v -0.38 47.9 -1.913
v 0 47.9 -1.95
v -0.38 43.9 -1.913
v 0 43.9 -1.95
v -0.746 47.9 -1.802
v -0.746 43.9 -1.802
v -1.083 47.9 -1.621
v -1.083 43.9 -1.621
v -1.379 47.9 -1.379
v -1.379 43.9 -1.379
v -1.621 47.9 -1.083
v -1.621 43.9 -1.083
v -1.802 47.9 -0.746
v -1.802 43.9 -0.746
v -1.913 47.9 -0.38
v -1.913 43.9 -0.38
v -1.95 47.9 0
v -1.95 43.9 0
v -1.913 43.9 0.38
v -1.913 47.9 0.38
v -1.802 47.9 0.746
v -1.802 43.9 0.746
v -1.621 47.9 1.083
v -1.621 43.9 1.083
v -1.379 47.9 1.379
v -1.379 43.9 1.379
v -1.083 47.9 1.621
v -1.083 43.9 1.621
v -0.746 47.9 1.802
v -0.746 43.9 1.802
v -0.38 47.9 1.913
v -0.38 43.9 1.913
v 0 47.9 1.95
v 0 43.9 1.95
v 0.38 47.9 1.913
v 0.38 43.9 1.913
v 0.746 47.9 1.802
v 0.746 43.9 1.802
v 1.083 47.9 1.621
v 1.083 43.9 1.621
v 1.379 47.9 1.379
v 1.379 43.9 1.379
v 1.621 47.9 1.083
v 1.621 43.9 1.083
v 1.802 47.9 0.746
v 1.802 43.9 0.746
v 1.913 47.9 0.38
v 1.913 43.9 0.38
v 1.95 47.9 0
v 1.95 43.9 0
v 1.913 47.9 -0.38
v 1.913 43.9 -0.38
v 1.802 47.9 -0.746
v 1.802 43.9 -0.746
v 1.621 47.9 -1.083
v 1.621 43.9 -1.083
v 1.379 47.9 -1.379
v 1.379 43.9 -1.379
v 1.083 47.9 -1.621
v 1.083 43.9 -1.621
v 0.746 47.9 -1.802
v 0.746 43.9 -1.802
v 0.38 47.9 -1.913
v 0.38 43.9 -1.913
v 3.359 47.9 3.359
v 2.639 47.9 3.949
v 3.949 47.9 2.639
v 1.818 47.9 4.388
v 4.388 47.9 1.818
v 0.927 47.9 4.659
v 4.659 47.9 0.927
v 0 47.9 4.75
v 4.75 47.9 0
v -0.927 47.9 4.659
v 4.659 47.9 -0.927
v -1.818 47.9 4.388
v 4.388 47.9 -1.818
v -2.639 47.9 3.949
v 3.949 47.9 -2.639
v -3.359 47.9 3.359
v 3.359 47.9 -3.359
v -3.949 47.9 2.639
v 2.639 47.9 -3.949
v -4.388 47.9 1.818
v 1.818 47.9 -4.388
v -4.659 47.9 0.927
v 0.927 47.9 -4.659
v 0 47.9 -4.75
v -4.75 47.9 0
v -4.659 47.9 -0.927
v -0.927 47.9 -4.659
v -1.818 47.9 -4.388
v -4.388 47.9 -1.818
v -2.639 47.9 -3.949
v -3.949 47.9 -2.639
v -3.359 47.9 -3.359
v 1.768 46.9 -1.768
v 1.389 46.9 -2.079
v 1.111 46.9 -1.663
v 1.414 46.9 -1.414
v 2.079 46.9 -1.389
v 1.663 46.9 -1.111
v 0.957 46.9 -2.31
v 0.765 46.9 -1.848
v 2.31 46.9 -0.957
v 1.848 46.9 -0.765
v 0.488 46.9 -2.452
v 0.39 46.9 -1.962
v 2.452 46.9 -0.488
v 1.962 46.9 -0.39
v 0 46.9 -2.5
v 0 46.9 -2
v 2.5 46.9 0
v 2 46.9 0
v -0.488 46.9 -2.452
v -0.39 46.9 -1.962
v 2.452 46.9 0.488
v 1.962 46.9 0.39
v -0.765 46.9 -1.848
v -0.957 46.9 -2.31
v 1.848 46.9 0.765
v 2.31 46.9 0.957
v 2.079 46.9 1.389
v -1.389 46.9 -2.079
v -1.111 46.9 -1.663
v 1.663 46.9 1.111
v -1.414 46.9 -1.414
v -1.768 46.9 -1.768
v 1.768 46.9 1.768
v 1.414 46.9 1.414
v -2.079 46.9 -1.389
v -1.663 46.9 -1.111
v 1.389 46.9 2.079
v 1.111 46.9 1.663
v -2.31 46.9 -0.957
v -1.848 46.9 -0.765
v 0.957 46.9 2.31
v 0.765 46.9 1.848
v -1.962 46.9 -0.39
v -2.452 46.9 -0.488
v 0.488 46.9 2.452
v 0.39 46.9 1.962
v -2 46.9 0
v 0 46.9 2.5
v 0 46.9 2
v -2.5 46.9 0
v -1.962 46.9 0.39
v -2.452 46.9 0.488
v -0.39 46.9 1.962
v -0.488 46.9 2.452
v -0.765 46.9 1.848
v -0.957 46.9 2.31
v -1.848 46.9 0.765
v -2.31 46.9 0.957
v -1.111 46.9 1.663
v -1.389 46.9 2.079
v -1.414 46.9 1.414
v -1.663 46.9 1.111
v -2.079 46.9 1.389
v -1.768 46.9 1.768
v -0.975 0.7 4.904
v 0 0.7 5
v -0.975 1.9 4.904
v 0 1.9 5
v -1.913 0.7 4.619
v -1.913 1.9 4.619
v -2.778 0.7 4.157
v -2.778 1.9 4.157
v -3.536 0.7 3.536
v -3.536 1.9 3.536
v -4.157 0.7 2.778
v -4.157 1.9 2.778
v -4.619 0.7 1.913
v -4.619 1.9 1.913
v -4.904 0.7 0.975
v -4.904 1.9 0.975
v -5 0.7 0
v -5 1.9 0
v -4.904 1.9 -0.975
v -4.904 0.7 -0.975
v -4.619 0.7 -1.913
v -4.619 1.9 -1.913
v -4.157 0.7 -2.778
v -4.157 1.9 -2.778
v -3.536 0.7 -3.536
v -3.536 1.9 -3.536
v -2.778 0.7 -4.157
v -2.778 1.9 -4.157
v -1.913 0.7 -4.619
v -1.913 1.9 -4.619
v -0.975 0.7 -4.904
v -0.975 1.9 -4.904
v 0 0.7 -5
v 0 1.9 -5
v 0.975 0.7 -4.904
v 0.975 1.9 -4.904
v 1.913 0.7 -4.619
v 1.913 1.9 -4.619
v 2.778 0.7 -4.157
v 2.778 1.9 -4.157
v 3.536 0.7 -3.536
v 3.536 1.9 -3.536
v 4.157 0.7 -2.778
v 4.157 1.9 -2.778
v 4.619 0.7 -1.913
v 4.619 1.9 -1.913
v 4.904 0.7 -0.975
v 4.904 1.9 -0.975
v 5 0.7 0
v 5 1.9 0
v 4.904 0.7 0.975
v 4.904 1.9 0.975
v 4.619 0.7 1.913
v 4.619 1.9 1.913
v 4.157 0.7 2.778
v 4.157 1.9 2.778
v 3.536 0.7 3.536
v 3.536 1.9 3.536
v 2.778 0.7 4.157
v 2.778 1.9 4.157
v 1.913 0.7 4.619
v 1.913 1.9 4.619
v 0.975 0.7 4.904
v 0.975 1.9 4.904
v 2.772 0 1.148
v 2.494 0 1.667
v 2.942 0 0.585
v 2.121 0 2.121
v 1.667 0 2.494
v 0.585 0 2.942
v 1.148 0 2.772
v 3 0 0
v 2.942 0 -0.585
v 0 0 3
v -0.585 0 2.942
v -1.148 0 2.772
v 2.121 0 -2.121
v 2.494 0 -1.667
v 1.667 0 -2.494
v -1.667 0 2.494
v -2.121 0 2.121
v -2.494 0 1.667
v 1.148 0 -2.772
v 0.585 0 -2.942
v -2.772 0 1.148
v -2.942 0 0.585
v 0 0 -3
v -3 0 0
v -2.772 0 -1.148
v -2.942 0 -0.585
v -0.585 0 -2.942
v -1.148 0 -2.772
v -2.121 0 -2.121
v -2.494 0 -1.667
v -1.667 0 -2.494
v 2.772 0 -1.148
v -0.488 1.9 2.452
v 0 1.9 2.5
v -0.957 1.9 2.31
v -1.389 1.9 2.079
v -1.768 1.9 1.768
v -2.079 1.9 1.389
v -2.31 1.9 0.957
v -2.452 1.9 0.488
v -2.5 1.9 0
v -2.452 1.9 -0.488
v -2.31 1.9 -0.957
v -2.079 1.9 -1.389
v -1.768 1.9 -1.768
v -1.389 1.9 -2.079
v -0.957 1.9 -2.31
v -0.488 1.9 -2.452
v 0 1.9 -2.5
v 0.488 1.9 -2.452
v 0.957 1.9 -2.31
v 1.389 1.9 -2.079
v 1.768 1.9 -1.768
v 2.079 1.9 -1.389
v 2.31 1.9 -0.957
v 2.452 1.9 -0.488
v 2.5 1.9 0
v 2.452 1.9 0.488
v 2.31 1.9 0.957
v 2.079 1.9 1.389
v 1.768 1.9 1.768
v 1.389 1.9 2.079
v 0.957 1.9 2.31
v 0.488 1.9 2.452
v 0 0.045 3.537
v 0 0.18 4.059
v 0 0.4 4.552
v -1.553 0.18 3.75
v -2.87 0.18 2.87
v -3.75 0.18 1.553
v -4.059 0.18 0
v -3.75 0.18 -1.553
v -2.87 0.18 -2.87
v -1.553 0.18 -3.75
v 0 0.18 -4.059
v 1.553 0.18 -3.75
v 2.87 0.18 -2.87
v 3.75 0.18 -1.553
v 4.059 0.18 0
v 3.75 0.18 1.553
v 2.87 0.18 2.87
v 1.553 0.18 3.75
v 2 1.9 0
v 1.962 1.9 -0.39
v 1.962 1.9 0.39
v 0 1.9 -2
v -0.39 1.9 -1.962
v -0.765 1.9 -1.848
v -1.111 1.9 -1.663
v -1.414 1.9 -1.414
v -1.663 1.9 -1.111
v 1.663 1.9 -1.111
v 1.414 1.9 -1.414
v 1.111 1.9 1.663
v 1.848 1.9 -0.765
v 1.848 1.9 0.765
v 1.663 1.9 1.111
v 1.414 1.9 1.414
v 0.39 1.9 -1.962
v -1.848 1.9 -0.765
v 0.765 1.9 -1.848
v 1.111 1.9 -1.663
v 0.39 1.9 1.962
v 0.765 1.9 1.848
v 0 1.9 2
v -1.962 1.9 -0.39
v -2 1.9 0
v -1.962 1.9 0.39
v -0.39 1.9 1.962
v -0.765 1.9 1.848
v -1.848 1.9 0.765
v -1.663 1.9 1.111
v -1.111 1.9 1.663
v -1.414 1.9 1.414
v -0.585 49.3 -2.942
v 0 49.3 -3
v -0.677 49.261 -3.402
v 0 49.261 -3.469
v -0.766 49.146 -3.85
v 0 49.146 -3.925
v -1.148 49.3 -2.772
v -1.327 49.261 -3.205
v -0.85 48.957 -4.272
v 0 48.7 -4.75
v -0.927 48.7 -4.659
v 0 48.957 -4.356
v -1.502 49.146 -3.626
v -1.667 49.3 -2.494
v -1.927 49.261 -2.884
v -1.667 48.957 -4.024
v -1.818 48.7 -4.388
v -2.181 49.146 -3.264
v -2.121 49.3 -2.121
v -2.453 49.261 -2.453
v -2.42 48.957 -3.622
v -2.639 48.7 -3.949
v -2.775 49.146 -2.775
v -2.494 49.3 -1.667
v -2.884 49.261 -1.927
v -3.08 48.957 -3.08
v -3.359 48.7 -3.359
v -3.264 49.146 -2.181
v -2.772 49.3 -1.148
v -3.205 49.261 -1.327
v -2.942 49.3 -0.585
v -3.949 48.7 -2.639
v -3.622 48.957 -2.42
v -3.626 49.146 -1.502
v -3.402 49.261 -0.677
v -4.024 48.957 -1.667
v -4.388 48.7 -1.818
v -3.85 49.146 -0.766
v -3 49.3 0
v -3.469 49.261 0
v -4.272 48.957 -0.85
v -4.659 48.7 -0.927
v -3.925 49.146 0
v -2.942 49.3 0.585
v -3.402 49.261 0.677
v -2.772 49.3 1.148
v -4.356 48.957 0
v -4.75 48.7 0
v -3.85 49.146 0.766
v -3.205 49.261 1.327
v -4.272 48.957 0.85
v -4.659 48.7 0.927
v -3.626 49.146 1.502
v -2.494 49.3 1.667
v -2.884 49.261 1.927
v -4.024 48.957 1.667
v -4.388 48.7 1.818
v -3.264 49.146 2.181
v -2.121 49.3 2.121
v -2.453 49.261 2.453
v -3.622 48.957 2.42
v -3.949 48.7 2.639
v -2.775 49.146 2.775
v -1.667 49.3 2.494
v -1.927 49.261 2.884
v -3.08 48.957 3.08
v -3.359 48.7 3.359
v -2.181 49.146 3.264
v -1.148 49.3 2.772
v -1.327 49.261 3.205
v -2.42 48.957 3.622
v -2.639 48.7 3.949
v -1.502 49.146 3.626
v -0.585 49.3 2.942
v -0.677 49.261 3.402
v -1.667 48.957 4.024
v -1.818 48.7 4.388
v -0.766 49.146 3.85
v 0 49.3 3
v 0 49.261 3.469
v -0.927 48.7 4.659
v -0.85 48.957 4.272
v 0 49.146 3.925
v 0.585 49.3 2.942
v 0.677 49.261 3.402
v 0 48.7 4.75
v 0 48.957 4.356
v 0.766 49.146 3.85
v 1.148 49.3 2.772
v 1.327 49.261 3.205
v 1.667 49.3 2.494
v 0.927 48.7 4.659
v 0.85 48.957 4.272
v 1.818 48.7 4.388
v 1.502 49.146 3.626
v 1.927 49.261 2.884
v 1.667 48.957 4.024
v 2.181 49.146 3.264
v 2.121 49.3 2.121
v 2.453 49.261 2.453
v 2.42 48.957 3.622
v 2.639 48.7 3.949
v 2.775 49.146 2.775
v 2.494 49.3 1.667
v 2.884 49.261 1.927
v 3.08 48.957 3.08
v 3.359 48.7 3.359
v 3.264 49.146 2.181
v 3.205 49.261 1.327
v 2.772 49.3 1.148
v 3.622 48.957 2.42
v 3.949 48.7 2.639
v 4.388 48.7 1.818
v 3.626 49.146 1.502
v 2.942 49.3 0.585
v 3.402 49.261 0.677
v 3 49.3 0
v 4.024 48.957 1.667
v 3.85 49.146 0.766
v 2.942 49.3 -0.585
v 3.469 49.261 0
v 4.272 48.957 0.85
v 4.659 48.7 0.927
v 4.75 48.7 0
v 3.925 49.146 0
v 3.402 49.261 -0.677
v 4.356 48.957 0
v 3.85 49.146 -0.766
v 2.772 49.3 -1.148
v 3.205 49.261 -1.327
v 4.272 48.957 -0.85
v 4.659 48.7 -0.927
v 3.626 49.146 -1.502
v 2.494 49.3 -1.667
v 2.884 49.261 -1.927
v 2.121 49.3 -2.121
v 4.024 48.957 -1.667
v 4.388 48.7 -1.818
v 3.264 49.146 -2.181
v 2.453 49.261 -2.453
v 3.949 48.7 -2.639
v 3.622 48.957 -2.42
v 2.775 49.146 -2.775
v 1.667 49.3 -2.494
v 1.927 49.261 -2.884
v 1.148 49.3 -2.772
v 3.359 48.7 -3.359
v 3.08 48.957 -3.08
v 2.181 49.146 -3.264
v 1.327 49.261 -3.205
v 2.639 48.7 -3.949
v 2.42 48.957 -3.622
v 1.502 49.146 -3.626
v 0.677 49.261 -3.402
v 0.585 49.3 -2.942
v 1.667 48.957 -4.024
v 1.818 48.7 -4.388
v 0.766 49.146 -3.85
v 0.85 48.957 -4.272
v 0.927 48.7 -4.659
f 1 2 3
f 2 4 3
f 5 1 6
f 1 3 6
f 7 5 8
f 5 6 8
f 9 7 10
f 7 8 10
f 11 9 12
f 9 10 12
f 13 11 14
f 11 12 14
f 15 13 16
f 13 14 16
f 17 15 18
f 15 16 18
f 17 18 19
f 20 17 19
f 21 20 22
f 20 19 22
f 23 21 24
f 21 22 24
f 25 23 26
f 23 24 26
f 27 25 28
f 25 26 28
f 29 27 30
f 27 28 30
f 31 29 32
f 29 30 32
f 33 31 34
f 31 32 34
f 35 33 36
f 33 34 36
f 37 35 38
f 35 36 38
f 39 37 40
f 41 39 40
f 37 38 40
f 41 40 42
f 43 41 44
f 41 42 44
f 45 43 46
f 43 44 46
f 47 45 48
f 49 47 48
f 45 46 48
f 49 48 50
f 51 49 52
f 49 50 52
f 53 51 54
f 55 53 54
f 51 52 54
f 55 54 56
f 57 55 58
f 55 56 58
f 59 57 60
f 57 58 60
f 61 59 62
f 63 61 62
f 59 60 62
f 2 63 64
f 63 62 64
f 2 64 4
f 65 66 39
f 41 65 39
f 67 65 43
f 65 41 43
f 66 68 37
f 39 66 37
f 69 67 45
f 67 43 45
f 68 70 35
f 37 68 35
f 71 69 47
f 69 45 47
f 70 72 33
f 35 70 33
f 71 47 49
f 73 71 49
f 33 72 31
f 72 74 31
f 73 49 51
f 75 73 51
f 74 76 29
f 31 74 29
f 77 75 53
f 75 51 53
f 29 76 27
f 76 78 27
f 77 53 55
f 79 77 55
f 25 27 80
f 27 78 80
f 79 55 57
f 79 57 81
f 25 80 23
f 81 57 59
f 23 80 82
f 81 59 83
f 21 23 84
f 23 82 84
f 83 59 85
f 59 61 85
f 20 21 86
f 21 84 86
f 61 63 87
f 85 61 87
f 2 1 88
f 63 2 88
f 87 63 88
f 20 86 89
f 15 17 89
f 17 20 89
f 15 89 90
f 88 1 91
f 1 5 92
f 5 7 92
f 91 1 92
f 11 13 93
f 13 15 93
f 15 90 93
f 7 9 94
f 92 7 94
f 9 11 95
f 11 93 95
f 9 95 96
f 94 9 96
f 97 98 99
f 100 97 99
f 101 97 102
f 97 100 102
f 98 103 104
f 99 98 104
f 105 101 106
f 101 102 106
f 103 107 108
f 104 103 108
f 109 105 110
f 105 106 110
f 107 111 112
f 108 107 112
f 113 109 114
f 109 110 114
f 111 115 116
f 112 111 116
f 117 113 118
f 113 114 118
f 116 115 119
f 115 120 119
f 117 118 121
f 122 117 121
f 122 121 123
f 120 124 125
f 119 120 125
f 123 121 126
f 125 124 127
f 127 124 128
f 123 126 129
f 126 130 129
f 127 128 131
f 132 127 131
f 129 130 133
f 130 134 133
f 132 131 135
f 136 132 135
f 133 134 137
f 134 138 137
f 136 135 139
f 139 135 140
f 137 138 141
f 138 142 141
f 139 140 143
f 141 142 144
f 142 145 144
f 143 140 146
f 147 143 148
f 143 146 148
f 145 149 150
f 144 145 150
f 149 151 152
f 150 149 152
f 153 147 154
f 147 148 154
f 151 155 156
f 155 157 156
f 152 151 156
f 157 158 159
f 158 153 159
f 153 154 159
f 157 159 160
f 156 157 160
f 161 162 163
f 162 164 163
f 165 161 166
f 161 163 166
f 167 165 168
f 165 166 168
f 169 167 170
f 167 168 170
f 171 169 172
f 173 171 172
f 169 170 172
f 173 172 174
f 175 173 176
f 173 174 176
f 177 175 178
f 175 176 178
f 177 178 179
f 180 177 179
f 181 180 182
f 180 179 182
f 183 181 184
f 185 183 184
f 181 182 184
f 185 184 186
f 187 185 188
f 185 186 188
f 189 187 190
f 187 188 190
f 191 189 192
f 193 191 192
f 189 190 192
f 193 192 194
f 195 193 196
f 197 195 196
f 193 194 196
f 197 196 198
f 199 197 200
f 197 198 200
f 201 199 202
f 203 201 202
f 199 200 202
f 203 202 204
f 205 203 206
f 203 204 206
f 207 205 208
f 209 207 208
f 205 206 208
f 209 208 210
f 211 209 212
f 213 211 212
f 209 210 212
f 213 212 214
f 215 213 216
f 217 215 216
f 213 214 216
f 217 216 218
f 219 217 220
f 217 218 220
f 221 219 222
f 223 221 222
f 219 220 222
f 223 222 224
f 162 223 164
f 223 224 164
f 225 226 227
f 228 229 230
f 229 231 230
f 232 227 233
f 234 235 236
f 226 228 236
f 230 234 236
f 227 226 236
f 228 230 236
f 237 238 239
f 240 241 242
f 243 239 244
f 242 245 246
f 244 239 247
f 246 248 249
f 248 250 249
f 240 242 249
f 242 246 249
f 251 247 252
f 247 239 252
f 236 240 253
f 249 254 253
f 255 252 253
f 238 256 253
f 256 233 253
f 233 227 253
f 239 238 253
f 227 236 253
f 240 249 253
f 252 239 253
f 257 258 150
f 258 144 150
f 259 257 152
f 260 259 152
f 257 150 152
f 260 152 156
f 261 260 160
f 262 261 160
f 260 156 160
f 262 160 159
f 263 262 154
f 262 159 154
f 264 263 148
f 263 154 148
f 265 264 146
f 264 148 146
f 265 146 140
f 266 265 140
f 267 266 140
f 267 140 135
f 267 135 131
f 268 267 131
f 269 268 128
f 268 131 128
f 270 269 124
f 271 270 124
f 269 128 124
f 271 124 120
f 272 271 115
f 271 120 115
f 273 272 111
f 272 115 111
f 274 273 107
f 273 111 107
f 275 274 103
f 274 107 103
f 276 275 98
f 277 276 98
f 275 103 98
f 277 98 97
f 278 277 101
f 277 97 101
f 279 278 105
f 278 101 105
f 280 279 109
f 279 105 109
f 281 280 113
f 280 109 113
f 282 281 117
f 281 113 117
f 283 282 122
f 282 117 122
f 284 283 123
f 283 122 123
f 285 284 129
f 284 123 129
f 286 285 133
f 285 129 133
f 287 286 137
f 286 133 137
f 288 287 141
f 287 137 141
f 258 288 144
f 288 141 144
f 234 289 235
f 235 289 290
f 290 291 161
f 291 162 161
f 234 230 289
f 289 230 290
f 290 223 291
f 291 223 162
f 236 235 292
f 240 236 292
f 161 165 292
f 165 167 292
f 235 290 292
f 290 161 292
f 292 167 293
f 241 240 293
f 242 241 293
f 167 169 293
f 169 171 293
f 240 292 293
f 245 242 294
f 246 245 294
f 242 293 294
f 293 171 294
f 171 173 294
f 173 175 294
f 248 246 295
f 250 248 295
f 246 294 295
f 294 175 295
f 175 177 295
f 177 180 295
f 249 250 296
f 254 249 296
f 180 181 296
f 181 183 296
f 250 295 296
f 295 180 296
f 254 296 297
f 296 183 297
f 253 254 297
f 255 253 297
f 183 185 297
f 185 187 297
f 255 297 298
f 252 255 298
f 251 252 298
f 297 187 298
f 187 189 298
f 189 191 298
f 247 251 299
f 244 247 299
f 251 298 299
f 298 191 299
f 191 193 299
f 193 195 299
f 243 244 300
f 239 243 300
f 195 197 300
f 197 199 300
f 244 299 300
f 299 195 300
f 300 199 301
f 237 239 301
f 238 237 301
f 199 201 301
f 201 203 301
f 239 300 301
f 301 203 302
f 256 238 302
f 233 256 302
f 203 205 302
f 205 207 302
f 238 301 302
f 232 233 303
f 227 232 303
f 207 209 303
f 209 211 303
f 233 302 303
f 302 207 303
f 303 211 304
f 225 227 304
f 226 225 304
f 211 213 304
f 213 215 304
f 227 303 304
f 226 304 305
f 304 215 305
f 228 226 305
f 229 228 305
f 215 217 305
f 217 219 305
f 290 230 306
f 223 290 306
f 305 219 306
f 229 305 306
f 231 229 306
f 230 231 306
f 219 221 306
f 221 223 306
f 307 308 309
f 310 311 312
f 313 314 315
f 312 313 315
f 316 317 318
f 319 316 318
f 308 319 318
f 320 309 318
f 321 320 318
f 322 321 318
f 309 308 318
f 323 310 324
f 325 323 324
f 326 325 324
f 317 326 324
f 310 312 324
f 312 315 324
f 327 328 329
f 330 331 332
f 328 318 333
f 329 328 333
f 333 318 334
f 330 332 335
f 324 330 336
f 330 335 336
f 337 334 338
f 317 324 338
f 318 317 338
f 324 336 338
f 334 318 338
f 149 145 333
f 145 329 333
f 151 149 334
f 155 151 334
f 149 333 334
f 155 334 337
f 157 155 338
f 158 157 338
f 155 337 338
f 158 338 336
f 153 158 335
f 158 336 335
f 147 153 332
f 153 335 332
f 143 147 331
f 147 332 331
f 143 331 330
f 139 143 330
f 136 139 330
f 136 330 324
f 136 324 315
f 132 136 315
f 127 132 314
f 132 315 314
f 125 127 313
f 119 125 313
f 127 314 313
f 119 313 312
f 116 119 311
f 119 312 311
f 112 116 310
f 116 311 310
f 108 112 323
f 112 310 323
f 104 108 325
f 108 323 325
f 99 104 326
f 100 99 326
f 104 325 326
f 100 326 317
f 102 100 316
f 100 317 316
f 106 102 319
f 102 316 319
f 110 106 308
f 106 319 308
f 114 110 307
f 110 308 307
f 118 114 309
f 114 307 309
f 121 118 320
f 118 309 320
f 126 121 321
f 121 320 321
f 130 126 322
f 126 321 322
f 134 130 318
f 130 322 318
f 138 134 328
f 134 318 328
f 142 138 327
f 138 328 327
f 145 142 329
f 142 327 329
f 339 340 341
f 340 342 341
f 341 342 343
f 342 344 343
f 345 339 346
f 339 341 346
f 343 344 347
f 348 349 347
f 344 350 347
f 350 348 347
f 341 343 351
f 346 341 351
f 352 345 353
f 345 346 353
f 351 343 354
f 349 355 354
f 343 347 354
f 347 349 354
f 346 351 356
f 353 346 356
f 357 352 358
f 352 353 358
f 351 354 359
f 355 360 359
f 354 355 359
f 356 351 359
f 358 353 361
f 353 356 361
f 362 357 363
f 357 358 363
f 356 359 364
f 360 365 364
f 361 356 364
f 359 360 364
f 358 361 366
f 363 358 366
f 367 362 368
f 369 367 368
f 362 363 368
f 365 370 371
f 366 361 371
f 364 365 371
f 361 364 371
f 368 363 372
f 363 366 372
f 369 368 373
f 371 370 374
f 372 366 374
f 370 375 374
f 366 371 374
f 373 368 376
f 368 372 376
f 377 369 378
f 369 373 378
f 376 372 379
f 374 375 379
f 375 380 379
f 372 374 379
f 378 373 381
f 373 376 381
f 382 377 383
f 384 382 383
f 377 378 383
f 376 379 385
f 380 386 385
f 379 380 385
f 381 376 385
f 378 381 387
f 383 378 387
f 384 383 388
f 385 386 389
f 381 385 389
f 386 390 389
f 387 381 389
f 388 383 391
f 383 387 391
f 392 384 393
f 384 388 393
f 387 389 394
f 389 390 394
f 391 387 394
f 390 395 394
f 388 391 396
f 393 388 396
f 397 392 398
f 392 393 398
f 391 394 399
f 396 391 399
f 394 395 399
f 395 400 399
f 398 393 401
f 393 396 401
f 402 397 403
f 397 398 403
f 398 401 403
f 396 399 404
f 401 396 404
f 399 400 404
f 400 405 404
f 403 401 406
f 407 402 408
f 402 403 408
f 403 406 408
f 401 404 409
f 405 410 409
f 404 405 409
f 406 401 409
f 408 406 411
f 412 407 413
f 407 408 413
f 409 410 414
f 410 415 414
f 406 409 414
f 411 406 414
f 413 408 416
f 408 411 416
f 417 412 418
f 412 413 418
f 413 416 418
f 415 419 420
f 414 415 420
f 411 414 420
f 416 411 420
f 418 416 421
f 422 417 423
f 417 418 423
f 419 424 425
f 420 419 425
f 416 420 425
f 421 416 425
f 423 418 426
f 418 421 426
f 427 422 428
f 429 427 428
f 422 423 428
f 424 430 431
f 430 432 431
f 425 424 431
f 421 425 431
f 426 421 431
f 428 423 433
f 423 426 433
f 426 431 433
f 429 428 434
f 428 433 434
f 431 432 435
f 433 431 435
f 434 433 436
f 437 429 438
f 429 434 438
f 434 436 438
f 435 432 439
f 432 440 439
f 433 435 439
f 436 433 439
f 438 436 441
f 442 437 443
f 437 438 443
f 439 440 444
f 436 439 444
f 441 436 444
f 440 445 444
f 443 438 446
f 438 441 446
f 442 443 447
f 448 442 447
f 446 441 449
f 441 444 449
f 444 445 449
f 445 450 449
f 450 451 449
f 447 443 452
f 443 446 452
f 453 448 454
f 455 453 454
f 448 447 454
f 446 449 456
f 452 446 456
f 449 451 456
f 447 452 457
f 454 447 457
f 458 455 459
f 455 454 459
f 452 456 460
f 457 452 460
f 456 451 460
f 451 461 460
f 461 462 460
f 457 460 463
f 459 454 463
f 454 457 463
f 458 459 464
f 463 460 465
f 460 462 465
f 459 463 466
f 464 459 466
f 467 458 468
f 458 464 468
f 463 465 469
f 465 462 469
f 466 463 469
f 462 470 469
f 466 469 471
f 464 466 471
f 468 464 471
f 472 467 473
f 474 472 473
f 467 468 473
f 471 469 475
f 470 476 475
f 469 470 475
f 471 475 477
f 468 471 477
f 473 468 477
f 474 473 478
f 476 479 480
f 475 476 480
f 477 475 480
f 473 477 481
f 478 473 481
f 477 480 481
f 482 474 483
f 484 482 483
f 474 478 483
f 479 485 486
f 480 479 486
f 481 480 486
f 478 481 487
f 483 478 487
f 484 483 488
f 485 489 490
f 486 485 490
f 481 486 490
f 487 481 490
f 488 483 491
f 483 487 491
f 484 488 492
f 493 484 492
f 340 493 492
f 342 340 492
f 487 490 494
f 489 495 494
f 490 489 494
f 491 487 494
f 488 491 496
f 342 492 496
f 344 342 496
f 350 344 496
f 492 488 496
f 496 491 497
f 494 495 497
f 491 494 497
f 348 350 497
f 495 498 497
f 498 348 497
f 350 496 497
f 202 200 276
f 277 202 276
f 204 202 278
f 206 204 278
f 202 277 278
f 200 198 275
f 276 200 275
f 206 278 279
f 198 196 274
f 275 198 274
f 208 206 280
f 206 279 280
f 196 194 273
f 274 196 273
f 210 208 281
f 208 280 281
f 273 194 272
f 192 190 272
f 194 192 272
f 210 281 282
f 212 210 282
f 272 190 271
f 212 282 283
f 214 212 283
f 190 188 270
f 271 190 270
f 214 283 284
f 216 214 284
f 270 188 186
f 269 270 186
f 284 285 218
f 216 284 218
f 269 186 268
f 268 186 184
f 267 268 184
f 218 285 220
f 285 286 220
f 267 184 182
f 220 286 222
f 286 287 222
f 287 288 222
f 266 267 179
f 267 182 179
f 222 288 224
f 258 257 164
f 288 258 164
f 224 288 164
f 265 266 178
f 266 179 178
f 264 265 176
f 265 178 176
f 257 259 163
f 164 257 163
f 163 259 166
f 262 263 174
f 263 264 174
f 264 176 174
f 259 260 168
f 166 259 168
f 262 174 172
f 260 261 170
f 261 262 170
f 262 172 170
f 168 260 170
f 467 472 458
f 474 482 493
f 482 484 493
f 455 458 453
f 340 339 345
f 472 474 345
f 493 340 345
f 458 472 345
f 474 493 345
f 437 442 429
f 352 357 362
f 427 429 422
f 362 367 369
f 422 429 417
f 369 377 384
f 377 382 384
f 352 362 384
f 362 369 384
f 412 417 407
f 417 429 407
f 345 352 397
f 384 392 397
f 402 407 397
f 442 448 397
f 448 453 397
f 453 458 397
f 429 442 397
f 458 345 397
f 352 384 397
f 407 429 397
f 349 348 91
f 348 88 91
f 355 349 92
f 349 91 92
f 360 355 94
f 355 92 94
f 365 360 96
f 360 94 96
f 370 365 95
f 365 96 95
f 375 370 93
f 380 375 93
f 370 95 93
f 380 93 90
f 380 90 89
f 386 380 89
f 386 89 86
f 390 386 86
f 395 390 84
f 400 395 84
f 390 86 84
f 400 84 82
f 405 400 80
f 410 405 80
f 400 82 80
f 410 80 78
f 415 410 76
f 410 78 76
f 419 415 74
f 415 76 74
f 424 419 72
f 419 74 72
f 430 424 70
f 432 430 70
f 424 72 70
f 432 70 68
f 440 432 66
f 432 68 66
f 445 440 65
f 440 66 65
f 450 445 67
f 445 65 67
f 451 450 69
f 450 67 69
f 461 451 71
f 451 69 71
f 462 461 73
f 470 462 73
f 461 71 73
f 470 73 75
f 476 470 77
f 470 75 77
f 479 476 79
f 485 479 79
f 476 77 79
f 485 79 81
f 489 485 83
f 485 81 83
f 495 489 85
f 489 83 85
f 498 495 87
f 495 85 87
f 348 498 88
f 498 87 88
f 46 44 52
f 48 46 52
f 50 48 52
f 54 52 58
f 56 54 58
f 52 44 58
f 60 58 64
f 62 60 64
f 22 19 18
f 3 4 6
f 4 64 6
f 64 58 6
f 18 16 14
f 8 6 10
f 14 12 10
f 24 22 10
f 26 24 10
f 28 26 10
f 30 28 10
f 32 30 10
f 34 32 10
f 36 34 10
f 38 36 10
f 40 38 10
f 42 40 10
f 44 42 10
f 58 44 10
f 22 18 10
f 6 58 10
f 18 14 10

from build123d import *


with BuildPart() as part:
    # 草图1 → 旋转1 (revolve)
    with BuildSketch(Plane.XY, mode=Mode.PRIVATE) as revolve_1_sk:
        with BuildLine():
            Line((0, 1.9), (0, 0))
            Line((0, 0), (3, 0))
            ThreePointArc((3, 0), (4.059481005, 0.180054271), (5, 0.7))
            Line((5, 0.7), (5, 1.9))
            Line((5, 1.9), (2.5, 1.9))
            Line((2.5, 1.9), (2.5, 46.9))
            Line((2.5, 46.9), (2, 46.9))
            Line((2, 46.9), (2, 1.9))
            Line((2, 1.9), (0, 1.9))
        make_face()
    revolve(revolve_1_sk.sketch.rotate(Axis((0, 8.469919731, 0), (0, -1, 0)), 90), axis=Axis((0, 8.469919731, 0), (0, -1, 0)))


with BuildPart() as body_2:
    # 草图2 → 旋转2 (revolve)
    with BuildSketch(Plane.XY, mode=Mode.PRIVATE) as revolve_2_sk:
        with BuildLine():
            Line((0, 43.9), (0, 49.3))
            Line((0, 49.3), (-3, 49.3))
            ThreePointArc((-3, 49.3), (-3.925, 49.145833333), (-4.75, 48.7))
            Line((-4.75, 48.7), (-4.75, 47.9))
            Line((-4.75, 47.9), (-1.95, 47.9))
            Line((-1.95, 47.9), (-1.95, 43.9))
            Line((-1.95, 43.9), (0, 43.9))
        make_face()
    revolve(revolve_2_sk.sketch.rotate(Axis((0, -6.2562109, 0), (0, 1, 0)), 270), axis=Axis((0, -6.2562109, 0), (0, 1, 0)))


solid = Compound([part.part, body_2.part])
